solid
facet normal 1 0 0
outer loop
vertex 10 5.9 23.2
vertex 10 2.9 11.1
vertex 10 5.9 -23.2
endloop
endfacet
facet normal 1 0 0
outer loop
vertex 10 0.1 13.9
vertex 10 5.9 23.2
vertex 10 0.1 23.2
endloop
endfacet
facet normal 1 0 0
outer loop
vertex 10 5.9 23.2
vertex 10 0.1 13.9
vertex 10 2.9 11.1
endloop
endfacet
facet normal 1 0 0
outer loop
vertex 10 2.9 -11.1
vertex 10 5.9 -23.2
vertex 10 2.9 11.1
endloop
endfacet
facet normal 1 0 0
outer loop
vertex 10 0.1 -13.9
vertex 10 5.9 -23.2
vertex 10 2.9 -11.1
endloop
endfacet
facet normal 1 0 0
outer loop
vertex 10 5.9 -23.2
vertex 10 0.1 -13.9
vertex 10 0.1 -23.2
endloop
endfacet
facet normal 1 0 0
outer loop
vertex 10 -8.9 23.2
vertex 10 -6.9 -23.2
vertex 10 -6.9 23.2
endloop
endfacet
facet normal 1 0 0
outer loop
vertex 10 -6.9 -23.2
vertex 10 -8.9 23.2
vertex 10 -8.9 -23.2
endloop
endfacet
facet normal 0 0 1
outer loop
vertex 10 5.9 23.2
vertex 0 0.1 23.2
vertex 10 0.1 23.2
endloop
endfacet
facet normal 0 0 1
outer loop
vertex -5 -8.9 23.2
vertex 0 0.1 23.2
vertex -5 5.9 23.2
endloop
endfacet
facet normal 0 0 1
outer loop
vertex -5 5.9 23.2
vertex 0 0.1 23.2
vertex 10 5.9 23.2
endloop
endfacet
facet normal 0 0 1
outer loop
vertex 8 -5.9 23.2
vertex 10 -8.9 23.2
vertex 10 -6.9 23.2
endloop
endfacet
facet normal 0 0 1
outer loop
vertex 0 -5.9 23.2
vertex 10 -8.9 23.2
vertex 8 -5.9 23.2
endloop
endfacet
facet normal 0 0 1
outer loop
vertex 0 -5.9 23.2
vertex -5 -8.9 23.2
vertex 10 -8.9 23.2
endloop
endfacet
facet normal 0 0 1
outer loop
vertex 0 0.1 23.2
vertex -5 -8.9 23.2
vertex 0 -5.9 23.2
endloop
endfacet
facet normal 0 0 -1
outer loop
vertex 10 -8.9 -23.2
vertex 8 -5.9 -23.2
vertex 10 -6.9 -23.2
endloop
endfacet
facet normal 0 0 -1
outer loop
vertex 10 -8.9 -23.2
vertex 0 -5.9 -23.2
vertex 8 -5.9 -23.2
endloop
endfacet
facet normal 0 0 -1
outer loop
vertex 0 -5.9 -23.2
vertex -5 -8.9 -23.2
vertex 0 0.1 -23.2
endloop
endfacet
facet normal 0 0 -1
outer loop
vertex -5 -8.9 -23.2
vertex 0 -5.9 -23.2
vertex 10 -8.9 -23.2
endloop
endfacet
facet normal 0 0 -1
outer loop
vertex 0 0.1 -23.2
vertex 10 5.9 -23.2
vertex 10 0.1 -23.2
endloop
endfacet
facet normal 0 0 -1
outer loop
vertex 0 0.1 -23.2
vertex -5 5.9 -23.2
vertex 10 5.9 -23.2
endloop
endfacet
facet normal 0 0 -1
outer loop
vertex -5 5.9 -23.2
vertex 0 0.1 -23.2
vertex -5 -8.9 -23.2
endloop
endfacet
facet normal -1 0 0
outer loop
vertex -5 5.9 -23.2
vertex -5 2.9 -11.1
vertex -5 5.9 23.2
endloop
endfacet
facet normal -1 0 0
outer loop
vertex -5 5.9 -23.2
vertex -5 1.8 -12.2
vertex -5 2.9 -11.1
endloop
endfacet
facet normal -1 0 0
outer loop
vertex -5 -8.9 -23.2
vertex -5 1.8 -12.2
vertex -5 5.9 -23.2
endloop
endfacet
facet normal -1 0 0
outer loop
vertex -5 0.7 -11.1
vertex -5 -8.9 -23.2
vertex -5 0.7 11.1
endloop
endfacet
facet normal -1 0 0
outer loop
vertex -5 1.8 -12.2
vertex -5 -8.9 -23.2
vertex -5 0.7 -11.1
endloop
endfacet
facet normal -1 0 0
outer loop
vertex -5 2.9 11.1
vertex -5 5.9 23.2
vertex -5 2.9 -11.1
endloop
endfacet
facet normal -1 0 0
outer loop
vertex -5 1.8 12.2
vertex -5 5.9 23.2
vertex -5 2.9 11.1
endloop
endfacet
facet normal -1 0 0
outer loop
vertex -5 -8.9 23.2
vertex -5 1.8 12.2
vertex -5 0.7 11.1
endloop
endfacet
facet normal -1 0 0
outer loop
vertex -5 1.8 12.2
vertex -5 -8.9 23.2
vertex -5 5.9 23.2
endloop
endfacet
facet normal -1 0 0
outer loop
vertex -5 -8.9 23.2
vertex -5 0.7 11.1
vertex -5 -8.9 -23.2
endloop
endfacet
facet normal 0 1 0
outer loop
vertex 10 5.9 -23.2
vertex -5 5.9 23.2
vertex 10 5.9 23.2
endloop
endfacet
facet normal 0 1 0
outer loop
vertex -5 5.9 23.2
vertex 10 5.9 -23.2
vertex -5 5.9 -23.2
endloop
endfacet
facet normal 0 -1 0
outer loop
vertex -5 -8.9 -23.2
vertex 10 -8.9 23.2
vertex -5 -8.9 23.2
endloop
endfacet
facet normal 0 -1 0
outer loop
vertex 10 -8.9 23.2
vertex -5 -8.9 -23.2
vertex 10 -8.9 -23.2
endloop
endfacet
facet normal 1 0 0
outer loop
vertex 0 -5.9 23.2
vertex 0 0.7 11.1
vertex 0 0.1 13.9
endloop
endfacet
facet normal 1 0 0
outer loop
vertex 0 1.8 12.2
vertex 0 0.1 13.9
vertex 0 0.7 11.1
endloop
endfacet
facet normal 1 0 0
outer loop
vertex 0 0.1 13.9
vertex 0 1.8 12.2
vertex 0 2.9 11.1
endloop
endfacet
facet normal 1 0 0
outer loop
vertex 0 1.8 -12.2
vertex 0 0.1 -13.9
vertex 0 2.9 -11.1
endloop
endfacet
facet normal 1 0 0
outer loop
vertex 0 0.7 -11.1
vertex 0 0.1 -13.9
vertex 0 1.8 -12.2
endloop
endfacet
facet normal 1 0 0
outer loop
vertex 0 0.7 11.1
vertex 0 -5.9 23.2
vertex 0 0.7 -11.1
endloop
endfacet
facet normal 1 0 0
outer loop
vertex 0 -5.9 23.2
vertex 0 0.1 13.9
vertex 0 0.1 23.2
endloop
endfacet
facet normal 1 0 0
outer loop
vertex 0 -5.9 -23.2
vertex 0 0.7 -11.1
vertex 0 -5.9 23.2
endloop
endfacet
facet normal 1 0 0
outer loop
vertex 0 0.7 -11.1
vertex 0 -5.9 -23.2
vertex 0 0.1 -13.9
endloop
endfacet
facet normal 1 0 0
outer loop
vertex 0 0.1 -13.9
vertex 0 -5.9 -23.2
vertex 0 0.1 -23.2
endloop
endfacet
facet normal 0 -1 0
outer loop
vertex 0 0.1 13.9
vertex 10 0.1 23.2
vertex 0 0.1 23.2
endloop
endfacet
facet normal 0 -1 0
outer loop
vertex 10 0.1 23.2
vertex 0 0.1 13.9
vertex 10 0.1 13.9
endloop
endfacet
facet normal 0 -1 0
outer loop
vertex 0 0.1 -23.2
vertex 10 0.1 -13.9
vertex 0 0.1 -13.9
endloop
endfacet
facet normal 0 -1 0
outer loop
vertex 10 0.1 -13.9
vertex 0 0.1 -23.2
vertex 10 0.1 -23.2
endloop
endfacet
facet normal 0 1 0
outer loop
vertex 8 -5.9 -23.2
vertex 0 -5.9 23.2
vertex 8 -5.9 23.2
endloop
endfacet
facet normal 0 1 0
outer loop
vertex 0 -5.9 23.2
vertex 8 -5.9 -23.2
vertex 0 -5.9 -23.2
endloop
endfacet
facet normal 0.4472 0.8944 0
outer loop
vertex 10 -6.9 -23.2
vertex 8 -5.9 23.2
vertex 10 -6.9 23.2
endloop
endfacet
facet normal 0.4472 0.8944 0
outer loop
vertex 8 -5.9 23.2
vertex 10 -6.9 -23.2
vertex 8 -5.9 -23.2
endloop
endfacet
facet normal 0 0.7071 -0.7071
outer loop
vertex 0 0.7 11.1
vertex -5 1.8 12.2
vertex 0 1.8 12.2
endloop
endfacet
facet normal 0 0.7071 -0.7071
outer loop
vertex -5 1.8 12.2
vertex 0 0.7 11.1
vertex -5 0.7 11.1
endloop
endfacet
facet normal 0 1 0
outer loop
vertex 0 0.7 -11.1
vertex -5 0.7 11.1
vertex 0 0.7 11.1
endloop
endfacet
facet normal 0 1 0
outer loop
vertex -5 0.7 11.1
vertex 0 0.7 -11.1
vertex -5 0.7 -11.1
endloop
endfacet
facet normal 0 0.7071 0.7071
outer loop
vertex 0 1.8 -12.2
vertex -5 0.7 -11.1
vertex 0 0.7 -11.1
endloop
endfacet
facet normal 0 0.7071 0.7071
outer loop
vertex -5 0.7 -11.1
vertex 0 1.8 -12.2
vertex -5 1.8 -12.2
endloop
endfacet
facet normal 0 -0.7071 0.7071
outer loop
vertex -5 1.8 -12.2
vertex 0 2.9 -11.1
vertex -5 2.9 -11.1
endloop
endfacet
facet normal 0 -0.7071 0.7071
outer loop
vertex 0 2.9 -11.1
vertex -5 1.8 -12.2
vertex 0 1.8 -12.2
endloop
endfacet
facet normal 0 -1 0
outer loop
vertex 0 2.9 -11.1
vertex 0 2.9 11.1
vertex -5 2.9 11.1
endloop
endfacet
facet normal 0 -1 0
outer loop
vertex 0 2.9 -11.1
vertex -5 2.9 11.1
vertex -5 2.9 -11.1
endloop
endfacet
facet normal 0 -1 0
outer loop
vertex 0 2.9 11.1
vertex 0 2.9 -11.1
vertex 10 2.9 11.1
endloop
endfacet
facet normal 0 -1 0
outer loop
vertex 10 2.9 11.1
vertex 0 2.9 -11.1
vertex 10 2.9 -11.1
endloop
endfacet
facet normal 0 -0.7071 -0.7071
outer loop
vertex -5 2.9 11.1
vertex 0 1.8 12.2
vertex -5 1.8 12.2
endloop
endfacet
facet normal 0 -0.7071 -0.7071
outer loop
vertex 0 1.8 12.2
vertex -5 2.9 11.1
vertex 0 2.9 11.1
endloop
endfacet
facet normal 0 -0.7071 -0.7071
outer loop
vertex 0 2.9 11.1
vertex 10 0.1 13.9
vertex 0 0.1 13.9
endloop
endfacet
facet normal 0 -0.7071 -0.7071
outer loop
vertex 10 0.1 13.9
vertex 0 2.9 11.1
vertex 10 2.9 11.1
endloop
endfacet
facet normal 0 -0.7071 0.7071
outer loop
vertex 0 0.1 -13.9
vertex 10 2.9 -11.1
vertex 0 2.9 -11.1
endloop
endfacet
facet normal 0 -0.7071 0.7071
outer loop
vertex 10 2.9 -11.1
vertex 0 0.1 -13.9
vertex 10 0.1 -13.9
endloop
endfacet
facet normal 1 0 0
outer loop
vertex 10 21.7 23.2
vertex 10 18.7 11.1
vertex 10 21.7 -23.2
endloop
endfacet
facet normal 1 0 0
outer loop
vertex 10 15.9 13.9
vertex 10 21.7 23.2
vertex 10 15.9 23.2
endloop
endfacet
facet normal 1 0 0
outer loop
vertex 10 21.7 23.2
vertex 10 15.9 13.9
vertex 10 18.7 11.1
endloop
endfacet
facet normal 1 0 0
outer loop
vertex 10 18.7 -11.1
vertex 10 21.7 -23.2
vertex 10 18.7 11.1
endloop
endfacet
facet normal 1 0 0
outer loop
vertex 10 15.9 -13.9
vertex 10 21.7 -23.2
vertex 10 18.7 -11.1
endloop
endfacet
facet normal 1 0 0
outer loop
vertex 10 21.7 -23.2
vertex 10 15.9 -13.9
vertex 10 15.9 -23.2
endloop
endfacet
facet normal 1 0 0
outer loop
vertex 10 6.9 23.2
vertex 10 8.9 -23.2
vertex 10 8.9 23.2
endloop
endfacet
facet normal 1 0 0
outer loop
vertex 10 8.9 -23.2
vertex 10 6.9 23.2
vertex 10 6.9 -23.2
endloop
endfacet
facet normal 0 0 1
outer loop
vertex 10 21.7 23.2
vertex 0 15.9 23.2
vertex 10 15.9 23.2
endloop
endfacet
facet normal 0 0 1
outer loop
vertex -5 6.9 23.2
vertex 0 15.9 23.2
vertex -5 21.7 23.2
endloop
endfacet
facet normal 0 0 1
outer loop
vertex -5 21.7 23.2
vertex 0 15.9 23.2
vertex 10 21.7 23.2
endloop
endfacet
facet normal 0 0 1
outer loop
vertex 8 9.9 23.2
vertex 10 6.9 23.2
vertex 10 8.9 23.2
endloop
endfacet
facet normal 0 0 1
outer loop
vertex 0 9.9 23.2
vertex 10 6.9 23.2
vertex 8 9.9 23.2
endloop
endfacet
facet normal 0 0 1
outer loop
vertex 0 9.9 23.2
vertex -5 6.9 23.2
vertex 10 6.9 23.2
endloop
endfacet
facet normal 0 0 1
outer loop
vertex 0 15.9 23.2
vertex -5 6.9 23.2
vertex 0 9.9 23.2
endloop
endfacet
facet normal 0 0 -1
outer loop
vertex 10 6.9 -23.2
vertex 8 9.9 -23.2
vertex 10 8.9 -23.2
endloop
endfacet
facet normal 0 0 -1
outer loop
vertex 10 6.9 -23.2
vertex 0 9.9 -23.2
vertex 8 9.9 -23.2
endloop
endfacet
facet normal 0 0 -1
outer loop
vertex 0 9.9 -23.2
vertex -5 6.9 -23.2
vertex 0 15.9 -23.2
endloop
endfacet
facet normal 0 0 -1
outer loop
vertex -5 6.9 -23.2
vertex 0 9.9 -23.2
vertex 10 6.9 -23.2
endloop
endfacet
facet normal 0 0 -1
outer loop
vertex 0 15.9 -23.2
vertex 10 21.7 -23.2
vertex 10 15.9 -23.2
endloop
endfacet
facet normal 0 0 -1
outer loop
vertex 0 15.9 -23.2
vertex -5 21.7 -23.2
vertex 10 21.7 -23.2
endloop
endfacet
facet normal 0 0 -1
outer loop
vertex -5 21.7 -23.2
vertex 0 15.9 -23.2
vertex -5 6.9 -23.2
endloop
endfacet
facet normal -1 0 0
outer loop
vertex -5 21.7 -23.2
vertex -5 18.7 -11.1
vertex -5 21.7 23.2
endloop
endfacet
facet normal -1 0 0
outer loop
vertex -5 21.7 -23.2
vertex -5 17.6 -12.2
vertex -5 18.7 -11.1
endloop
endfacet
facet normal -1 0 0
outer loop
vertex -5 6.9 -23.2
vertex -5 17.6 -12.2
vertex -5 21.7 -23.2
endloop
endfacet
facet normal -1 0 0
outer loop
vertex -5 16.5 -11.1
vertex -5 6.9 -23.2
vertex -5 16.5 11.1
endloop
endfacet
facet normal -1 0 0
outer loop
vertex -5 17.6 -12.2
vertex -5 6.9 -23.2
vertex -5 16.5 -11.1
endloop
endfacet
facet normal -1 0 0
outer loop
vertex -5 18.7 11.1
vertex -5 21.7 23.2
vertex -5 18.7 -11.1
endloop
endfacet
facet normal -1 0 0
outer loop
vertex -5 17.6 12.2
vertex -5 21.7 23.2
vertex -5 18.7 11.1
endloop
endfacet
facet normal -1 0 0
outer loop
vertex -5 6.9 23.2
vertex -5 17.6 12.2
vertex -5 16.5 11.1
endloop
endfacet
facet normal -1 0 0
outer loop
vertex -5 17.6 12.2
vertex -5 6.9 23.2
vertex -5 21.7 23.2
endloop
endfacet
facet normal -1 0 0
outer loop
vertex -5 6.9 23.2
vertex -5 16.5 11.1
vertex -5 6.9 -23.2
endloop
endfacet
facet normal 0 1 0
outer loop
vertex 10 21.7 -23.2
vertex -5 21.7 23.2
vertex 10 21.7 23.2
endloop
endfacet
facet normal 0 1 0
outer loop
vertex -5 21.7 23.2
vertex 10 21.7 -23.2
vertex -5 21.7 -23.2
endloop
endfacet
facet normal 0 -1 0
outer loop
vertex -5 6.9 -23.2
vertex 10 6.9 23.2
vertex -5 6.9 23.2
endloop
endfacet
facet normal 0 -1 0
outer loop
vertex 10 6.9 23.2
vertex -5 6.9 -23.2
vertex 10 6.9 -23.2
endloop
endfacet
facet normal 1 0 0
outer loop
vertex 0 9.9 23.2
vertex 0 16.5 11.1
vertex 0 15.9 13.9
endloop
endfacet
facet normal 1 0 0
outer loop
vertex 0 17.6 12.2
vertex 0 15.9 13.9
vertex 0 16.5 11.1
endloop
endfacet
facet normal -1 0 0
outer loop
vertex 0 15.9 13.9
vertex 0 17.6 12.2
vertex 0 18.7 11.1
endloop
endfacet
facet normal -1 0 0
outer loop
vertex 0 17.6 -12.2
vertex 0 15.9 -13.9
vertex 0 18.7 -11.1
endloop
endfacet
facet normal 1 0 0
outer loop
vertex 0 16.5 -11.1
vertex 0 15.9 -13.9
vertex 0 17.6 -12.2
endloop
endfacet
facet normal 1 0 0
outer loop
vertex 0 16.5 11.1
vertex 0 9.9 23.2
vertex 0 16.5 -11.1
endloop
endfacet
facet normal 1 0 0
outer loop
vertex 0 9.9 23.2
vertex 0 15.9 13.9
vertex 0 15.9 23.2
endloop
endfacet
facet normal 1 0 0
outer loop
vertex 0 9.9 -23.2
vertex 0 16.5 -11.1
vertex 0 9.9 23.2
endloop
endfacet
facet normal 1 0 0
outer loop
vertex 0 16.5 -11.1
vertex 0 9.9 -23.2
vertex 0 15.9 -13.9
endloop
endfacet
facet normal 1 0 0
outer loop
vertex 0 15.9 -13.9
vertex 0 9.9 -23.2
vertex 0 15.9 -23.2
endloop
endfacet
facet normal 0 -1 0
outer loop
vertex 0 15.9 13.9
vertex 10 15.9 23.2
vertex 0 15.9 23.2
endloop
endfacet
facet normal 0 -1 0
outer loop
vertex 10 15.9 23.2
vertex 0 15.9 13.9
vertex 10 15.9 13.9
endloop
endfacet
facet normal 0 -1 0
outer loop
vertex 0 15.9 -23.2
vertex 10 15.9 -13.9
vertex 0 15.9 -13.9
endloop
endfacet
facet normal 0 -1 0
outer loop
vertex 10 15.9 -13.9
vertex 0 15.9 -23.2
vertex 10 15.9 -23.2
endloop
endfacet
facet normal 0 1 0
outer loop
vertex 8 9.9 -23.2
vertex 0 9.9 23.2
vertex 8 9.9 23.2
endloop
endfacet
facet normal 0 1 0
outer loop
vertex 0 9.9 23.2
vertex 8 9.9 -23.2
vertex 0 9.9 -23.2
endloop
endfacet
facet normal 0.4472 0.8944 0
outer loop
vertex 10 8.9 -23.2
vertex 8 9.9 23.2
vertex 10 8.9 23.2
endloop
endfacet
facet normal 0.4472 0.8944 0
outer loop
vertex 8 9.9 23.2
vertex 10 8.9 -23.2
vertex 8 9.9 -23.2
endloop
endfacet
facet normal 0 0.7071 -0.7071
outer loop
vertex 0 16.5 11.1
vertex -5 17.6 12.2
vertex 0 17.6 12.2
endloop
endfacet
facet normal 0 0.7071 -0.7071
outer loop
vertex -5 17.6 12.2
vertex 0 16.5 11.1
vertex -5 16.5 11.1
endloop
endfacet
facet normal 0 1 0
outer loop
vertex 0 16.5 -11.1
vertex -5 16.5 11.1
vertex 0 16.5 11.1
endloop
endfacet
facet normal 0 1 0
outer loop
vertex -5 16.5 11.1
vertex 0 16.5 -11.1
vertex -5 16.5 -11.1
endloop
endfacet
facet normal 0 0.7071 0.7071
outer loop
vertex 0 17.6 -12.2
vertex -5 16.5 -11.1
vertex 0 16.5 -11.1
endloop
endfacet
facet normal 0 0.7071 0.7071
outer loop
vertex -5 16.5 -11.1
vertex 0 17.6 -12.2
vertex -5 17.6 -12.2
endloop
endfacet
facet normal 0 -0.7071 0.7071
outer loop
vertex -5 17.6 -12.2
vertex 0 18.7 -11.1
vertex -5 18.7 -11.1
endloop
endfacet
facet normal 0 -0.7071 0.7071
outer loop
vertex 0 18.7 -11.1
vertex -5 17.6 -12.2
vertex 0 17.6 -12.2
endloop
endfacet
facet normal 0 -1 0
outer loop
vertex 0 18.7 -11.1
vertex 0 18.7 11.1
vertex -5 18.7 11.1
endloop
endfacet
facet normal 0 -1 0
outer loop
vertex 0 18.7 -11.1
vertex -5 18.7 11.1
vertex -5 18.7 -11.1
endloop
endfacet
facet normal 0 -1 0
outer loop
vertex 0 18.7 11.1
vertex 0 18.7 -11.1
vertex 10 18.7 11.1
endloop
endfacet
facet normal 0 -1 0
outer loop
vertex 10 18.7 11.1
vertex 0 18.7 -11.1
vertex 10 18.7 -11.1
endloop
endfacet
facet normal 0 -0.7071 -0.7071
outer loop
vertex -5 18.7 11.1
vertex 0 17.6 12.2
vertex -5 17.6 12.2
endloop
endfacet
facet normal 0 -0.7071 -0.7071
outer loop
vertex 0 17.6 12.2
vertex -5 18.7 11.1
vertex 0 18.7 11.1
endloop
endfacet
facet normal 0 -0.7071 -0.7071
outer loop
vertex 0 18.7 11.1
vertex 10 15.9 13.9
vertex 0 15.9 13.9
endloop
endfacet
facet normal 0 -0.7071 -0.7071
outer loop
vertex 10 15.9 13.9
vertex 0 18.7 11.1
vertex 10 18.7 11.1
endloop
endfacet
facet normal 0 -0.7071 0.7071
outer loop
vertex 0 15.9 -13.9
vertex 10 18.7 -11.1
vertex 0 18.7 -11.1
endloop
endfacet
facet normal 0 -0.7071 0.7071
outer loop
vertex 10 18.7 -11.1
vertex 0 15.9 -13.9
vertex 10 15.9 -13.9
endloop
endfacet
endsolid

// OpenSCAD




// preview[view:east, tilt:top diagonal]

/*[Parameters]*/

metal_bar_thickness = 2.0;      //
metal_bar_width = 22.0; //
raft_thickness = 0.8;   //
bed_thickness = 5.8;   //
clearance = 0.1;        //[0.0:0.0mm,0.1:0.1mm,0.2:0.2mm,0.3:0.3mm,0.4:0.4mm]
quantity = 2;   //[1:1,2:2,3:3,4:4]
inner_length = 10.0;    //
outer_length = 5.0;    //

/*[Hidden]*/

module anti_warping_jig() {
	fn=36;
	plate_thickness = 3.0;
	plate_side_width = 10.0;
	adj=0.1;

	all_height = metal_bar_thickness + raft_thickness + bed_thickness + clearance*2 + plate_thickness*2;
	all_width = inner_length + outer_length;
	all_depth = metal_bar_width + metal_bar_thickness*2 + clearance*4 + plate_side_width*2;

	plate_bevel_width = inner_length >= 4 ? 2 : ( inner_length >= 2 ? inner_length - 2 : 0 );
	plate_bevel_height = plate_thickness >= 2 ? 1 : ( plate_thickness >= 1 ? plate_thickness - 1 : 0 );

	//side_bevel_outer = outer_length >= 4 ? 2 : ( outer_length >= 2 ? outer_length - 2 : 0 );
	//side_bevel_inner = plate_side_width >= 4 ? 2 : ( plate_side_width >= 2 ? plate_side_width - 2 : 0 );


	for ( q = [0:quantity-1] ) {

		translate([0,q*(all_height+1.0),0]) {
			intersection() {
				union() {

					difference() {

						translate([
							-outer_length
							,-bed_thickness - clearance - plate_thickness
							,-all_depth/2
						]) {
							cube([
								all_width
								,all_height
								,all_depth
							]);
						}

						translate([
							0
							,-bed_thickness - clearance
							,-all_depth/2 - adj
						]) {
							cube([
								inner_length + adj
								,bed_thickness + clearance*2
								,all_depth + adj*2
							]);
						}

						translate([
							0
							,0
							,-all_depth/2 - adj
						]) {

							linear_extrude(height=all_depth + adj*2,center=false,convex=10) {
								polygon(points=[
									[ inner_length - plate_bevel_width , -bed_thickness - clearance + adj ]
									,[ inner_length - plate_bevel_width , -bed_thickness - clearance ]
									,[ inner_length , -bed_thickness - clearance - plate_bevel_height ]
									,[ inner_length + adj , -bed_thickness - clearance - plate_bevel_height ]
									,[ inner_length + adj , -bed_thickness - clearance + adj ]
								]);
							}

						}


						translate([
							adj
							,-clearance
							,0
						]) {

							rotate([0,-90,0]) {

								linear_extrude(height=outer_length + adj*2 , center=false,convex=10) {
									polygon(points=[
										[ metal_bar_width/2 + clearance , raft_thickness + metal_bar_thickness + clearance*2 ]
										,[ metal_bar_width/2 + clearance + metal_bar_thickness/2 + clearance , raft_thickness + metal_bar_thickness/2 + clearance ]
										,[ metal_bar_width/2 + clearance , raft_thickness ]
										,[ -metal_bar_width/2 - clearance , raft_thickness ]
										,[ -metal_bar_width/2 - clearance - metal_bar_thickness/2 - clearance , raft_thickness + metal_bar_thickness/2 + clearance ]
										,[ -metal_bar_width/2 - clearance , raft_thickness + metal_bar_thickness + clearance*2 ]
									]);
								}

							}

						}

						translate([
							0
							,-clearance
							,0
						]) {

							rotate([0,90,0]) {

								linear_extrude(height=inner_length + adj,center=false,convex=10) {
									polygon(points=[
										[ metal_bar_width/2 + clearance , raft_thickness + metal_bar_thickness + clearance*2 ]
										,[ metal_bar_width/2 + raft_thickness + metal_bar_thickness + clearance*2 + clearance , 0 ]
										,[ metal_bar_width/2 + raft_thickness + metal_bar_thickness + clearance*2 + clearance , - adj ]
										,[ -metal_bar_width/2 - raft_thickness - metal_bar_thickness - clearance*2 - clearance , - adj ]
										,[ -metal_bar_width/2 - raft_thickness - metal_bar_thickness - clearance*2 - clearance , 0 ]
										,[ -metal_bar_width/2 - clearance , raft_thickness + metal_bar_thickness + clearance*2 ]
									]);
								}

							}

						}











					}
				}
			}
		}


	}

}

anti_warping_jig();
